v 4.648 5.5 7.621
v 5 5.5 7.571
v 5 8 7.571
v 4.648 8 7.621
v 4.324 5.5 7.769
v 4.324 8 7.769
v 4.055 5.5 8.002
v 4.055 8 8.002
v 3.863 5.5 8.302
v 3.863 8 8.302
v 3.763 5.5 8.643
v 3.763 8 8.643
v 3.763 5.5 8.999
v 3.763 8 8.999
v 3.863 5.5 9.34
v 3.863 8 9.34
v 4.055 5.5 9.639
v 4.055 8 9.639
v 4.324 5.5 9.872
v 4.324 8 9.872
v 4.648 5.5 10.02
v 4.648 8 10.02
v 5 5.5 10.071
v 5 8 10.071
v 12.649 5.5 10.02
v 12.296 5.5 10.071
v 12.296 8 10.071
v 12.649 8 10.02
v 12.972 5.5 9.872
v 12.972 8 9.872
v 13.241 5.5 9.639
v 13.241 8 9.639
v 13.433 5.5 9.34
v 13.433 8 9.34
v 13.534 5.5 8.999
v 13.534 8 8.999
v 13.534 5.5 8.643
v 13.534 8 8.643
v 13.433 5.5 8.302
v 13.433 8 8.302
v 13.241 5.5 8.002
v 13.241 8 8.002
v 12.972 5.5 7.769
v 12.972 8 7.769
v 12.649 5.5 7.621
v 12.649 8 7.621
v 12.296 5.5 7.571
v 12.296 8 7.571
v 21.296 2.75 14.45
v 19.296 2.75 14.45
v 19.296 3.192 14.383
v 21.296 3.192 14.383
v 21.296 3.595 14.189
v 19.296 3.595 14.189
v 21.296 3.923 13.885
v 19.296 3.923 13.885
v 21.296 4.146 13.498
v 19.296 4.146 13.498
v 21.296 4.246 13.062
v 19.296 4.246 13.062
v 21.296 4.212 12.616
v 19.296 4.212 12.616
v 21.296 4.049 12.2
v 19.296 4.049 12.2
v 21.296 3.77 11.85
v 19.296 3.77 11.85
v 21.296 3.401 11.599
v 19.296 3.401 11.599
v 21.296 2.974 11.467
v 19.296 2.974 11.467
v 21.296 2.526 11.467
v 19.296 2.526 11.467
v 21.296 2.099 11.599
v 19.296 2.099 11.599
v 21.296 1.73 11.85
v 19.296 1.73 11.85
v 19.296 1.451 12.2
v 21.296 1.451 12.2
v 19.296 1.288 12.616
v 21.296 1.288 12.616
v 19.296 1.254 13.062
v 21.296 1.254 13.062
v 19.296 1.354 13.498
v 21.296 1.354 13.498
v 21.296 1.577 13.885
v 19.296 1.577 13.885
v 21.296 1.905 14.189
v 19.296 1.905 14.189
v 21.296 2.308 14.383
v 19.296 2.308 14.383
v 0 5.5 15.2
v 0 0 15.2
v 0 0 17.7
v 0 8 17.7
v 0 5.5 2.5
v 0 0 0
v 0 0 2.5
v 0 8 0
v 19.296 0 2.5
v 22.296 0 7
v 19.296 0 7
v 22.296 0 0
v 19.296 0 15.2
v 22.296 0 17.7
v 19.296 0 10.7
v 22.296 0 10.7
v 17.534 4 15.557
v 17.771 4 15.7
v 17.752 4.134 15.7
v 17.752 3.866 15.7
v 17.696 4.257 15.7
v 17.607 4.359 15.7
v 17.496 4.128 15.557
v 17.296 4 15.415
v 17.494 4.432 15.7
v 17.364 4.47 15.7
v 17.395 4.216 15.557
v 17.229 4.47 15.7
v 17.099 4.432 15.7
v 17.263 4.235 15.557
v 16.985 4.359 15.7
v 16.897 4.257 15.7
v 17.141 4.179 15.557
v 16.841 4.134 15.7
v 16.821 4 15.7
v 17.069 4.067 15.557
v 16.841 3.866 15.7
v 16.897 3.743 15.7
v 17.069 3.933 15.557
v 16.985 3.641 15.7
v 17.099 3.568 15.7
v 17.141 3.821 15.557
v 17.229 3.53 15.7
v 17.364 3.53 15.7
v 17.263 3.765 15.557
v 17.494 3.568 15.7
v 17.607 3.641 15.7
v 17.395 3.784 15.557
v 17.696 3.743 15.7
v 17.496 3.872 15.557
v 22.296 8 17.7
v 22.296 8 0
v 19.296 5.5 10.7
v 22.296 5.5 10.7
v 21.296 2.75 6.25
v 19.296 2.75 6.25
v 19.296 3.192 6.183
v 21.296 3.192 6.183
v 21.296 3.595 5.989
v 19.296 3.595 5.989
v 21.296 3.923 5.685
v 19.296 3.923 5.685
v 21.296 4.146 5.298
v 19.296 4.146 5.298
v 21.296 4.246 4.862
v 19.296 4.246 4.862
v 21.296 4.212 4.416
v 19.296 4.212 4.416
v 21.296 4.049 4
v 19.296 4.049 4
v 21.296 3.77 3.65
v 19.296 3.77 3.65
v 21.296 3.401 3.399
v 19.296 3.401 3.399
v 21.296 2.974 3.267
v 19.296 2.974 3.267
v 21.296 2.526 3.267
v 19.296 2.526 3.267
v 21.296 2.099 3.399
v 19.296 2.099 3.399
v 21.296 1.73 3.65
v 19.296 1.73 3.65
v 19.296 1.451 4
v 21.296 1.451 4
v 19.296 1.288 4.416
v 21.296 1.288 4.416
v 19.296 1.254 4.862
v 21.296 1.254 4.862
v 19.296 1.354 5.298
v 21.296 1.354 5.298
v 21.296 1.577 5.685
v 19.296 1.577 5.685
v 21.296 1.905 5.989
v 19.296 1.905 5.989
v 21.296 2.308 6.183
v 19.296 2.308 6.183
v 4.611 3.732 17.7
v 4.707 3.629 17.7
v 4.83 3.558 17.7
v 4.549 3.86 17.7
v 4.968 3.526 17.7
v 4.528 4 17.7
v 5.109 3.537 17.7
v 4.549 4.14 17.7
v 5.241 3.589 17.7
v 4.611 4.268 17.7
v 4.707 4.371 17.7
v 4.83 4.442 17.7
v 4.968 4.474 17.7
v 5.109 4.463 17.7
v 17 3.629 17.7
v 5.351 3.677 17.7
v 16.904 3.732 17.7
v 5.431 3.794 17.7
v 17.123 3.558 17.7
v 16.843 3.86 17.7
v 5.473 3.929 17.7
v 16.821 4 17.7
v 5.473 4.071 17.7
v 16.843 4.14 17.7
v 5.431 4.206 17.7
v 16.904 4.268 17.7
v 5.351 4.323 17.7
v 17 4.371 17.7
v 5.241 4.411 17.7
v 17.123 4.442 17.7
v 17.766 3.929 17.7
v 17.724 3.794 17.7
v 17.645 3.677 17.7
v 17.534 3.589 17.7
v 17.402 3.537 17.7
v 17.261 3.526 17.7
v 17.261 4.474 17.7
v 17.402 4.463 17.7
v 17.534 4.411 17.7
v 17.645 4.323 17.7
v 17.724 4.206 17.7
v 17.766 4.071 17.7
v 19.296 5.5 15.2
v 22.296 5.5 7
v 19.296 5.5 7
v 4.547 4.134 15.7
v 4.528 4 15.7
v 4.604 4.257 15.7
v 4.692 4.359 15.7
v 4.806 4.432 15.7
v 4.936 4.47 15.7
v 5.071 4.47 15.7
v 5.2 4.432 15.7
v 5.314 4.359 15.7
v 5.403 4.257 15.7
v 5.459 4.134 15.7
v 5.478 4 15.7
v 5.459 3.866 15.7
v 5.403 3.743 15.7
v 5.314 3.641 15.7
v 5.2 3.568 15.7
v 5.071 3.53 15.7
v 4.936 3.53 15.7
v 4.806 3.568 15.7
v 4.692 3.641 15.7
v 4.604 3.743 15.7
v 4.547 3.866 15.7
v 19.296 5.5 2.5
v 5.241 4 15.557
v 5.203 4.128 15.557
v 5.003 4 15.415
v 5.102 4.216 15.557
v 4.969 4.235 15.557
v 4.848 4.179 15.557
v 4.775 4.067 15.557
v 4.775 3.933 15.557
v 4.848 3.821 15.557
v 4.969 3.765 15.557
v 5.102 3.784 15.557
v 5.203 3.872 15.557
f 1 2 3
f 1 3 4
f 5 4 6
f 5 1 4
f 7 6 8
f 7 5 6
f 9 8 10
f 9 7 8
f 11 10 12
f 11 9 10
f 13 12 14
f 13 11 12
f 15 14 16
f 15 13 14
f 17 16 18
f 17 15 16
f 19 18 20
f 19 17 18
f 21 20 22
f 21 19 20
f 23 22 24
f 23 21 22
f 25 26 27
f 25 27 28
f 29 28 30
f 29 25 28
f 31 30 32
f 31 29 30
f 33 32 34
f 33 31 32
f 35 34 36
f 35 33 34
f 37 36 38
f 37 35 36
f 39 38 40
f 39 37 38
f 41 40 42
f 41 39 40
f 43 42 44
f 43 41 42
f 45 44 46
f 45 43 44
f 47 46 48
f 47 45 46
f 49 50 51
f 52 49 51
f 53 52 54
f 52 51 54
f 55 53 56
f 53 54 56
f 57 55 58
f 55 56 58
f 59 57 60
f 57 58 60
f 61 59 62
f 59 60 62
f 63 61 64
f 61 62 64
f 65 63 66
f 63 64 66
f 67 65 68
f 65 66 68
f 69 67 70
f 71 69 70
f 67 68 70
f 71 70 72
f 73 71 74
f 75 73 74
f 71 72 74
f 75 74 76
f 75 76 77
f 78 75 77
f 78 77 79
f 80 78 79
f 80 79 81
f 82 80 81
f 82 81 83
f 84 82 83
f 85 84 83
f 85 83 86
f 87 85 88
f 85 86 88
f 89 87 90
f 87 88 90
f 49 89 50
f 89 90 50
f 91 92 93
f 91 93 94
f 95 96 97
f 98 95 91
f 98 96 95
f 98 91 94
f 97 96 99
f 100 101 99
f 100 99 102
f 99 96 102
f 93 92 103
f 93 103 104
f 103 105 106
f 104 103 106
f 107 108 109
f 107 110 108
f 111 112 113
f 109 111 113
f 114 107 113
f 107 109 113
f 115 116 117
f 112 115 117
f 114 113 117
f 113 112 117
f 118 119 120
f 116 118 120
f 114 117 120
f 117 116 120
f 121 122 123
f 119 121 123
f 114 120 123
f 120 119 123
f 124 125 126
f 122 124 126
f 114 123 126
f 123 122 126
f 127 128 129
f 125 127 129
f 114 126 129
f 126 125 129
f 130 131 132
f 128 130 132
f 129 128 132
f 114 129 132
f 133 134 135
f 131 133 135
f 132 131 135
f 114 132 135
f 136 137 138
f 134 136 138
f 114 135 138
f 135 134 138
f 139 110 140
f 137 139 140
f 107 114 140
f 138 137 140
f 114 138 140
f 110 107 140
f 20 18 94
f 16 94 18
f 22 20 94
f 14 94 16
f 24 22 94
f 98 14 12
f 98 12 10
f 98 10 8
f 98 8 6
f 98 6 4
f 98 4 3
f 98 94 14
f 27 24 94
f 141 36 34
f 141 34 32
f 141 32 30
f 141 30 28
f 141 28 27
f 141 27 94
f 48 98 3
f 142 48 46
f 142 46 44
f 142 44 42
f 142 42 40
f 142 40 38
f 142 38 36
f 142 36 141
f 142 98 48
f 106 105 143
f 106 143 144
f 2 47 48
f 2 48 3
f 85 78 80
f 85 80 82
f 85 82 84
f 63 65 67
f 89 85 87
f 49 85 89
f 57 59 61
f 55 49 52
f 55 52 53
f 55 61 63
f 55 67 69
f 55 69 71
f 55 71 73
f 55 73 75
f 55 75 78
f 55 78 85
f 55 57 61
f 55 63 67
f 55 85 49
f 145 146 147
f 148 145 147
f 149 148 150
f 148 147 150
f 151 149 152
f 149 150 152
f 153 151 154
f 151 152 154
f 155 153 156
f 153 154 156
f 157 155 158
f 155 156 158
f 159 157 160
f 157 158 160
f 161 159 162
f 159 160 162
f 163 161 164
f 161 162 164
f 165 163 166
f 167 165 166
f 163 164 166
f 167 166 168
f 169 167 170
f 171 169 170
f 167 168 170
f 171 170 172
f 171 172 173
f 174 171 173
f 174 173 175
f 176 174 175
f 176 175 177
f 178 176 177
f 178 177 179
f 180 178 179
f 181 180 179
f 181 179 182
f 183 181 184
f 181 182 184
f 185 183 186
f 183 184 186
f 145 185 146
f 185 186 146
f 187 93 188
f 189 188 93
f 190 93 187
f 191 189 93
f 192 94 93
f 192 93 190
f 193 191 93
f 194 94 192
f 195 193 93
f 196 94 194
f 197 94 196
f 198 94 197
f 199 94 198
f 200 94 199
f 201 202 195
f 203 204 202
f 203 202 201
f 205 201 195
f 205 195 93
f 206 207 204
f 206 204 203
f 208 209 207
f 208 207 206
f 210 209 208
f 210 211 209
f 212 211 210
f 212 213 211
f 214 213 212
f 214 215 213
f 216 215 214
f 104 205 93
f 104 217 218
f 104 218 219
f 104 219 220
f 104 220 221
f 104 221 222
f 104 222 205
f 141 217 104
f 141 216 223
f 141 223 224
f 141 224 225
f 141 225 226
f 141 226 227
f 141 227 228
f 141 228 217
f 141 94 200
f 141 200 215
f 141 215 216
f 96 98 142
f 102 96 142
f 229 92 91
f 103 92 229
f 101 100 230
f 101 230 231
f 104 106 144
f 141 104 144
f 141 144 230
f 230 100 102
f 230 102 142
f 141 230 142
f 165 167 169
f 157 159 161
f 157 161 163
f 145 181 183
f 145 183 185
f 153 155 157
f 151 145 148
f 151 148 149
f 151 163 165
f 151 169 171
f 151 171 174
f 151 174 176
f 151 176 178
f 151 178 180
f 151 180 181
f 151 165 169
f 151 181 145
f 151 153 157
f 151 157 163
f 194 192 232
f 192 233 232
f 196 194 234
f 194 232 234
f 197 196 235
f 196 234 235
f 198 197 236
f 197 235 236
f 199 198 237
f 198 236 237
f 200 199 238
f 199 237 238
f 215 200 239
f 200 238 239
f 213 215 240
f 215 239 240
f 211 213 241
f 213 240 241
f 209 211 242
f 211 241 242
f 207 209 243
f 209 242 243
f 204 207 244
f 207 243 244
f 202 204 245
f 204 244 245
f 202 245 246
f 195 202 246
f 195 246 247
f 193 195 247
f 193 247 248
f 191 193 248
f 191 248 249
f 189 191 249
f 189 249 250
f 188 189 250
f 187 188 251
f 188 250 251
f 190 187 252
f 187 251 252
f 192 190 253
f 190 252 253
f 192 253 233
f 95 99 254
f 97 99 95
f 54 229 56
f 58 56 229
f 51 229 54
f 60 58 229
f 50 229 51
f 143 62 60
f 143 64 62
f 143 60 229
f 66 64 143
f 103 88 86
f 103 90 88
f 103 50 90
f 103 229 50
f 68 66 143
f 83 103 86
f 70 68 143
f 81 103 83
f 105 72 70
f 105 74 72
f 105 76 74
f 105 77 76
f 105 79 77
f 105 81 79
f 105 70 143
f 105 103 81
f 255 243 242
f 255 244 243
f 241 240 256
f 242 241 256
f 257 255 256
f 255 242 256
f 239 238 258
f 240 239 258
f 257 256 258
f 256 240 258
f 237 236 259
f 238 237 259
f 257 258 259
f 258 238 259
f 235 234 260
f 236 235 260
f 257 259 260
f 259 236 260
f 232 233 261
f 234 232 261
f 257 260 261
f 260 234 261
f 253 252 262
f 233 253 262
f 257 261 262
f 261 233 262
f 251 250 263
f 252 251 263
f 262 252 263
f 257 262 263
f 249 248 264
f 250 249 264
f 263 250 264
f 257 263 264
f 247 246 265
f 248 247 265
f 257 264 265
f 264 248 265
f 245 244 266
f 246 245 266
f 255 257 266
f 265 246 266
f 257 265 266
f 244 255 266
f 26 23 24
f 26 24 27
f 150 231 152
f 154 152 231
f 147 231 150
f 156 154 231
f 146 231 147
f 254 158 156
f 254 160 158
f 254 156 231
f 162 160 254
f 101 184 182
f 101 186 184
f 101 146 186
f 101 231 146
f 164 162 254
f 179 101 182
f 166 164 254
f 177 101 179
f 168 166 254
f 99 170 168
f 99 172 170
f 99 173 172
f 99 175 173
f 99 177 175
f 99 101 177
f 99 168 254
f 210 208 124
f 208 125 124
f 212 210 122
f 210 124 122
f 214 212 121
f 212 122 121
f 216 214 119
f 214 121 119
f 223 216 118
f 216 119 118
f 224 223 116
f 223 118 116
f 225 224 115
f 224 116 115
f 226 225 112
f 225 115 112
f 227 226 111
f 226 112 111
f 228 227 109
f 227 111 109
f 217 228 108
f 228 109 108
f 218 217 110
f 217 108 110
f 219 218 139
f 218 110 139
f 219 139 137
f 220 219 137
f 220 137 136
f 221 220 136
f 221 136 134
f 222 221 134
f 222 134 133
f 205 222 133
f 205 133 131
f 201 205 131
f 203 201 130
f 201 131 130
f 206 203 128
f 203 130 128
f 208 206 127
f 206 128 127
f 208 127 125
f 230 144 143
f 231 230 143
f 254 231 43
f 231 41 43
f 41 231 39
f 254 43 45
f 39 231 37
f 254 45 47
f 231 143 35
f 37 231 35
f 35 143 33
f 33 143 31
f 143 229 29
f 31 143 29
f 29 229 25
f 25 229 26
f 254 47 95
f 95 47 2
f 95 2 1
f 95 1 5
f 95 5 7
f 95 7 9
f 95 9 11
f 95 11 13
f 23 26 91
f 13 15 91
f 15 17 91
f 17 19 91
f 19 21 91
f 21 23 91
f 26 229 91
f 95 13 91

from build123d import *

# Parameters (mm, degrees)
SKETCH2_W                    = 22.296412808
SKETCH2_H                    = 8
BOSS_EXTRUDE1_DEPTH          = 17.7
CUT_EXTRUDE2_DEPTH           = 5.5
CUT_EXTRUDE3_REACH           = 30.994
SKETCH9_R                    = 1.5
CUT_EXTRUDE4_DEPTH           = 2
M1_2X0_25_TAPPED_HOLE2_D     = 0.95
M1_2X0_25_TAPPED_HOLE2_DEPTH = 2
M1_2X0_25_TAPPED_HOLE2_TIP   = 0.285408794


with BuildPart() as part:
    # Sketch2 → Boss-Extrude1 (new body)
    with BuildSketch(Plane.XY):
        with Locations((11.148206404, 4)):
            Rectangle(SKETCH2_W, SKETCH2_H)
    extrude(amount=BOSS_EXTRUDE1_DEPTH)

    # Sketch3 → Cut-Extrude2 (cut)
    with BuildSketch(Plane.XZ):
        Polygon((0, 15.2), (19.296412808, 15.2), (19.296412808, 10.7), (22.296412808, 10.7), (22.296412808, 7), (19.296412808, 7), (19.296412808, 2.5), (0, 2.5), align=None)
    extrude(amount=-CUT_EXTRUDE2_DEPTH, mode=Mode.SUBTRACT)

    # Sketch4 → Cut-Extrude3 (cut, up to next)
    with BuildSketch(Plane.XZ.offset(-5.5), mode=Mode.PRIVATE) as cut_extrude3_sk1:
        with BuildLine():
            Line((5, 10.070818057), (12.296412808, 10.070818057))
            ThreePointArc((12.296412808, 10.070818057), (13.546412808, 8.820818057), (12.296412808, 7.570818057))
            Line((12.296412808, 7.570818057), (5, 7.570818057))
            ThreePointArc((5, 7.570818057), (3.75, 8.820818057), (5, 10.070818057))
        make_face()
    cut_extrude3_tool1 = extrude(cut_extrude3_sk1.sketch, amount=-CUT_EXTRUDE3_REACH, mode=Mode.PRIVATE) & part.part
    add(cut_extrude3_tool1.solids().sort_by_distance((8.648206, 5.5, 8.820818))[0], mode=Mode.SUBTRACT)

    # Sketch9 → Cut-Extrude4 (cut)
    with BuildSketch(Plane.ZY.offset(-19.296412808)):
        with Locations((4.75, 2.75)):
            Circle(SKETCH9_R)
        with Locations((12.95, 2.75)):
            Circle(SKETCH9_R)
    extrude(amount=-CUT_EXTRUDE4_DEPTH, mode=Mode.SUBTRACT)

    # M1.2x0.25 Tapped Hole2
    with Locations(Plane(origin=(17.296412808, 4, 17.7), x_dir=(1, 0, 0), z_dir=(0, 0, 1))):
        with Locations((0, 0), (-12.293258023, 0)):
            Hole(M1_2X0_25_TAPPED_HOLE2_D / 2, depth=M1_2X0_25_TAPPED_HOLE2_DEPTH)
            with Locations((0, 0, -(M1_2X0_25_TAPPED_HOLE2_DEPTH + M1_2X0_25_TAPPED_HOLE2_TIP / 2))):  # 118° drill point
                Cone(0, M1_2X0_25_TAPPED_HOLE2_D / 2, M1_2X0_25_TAPPED_HOLE2_TIP, mode=Mode.SUBTRACT)


solid = part.part
